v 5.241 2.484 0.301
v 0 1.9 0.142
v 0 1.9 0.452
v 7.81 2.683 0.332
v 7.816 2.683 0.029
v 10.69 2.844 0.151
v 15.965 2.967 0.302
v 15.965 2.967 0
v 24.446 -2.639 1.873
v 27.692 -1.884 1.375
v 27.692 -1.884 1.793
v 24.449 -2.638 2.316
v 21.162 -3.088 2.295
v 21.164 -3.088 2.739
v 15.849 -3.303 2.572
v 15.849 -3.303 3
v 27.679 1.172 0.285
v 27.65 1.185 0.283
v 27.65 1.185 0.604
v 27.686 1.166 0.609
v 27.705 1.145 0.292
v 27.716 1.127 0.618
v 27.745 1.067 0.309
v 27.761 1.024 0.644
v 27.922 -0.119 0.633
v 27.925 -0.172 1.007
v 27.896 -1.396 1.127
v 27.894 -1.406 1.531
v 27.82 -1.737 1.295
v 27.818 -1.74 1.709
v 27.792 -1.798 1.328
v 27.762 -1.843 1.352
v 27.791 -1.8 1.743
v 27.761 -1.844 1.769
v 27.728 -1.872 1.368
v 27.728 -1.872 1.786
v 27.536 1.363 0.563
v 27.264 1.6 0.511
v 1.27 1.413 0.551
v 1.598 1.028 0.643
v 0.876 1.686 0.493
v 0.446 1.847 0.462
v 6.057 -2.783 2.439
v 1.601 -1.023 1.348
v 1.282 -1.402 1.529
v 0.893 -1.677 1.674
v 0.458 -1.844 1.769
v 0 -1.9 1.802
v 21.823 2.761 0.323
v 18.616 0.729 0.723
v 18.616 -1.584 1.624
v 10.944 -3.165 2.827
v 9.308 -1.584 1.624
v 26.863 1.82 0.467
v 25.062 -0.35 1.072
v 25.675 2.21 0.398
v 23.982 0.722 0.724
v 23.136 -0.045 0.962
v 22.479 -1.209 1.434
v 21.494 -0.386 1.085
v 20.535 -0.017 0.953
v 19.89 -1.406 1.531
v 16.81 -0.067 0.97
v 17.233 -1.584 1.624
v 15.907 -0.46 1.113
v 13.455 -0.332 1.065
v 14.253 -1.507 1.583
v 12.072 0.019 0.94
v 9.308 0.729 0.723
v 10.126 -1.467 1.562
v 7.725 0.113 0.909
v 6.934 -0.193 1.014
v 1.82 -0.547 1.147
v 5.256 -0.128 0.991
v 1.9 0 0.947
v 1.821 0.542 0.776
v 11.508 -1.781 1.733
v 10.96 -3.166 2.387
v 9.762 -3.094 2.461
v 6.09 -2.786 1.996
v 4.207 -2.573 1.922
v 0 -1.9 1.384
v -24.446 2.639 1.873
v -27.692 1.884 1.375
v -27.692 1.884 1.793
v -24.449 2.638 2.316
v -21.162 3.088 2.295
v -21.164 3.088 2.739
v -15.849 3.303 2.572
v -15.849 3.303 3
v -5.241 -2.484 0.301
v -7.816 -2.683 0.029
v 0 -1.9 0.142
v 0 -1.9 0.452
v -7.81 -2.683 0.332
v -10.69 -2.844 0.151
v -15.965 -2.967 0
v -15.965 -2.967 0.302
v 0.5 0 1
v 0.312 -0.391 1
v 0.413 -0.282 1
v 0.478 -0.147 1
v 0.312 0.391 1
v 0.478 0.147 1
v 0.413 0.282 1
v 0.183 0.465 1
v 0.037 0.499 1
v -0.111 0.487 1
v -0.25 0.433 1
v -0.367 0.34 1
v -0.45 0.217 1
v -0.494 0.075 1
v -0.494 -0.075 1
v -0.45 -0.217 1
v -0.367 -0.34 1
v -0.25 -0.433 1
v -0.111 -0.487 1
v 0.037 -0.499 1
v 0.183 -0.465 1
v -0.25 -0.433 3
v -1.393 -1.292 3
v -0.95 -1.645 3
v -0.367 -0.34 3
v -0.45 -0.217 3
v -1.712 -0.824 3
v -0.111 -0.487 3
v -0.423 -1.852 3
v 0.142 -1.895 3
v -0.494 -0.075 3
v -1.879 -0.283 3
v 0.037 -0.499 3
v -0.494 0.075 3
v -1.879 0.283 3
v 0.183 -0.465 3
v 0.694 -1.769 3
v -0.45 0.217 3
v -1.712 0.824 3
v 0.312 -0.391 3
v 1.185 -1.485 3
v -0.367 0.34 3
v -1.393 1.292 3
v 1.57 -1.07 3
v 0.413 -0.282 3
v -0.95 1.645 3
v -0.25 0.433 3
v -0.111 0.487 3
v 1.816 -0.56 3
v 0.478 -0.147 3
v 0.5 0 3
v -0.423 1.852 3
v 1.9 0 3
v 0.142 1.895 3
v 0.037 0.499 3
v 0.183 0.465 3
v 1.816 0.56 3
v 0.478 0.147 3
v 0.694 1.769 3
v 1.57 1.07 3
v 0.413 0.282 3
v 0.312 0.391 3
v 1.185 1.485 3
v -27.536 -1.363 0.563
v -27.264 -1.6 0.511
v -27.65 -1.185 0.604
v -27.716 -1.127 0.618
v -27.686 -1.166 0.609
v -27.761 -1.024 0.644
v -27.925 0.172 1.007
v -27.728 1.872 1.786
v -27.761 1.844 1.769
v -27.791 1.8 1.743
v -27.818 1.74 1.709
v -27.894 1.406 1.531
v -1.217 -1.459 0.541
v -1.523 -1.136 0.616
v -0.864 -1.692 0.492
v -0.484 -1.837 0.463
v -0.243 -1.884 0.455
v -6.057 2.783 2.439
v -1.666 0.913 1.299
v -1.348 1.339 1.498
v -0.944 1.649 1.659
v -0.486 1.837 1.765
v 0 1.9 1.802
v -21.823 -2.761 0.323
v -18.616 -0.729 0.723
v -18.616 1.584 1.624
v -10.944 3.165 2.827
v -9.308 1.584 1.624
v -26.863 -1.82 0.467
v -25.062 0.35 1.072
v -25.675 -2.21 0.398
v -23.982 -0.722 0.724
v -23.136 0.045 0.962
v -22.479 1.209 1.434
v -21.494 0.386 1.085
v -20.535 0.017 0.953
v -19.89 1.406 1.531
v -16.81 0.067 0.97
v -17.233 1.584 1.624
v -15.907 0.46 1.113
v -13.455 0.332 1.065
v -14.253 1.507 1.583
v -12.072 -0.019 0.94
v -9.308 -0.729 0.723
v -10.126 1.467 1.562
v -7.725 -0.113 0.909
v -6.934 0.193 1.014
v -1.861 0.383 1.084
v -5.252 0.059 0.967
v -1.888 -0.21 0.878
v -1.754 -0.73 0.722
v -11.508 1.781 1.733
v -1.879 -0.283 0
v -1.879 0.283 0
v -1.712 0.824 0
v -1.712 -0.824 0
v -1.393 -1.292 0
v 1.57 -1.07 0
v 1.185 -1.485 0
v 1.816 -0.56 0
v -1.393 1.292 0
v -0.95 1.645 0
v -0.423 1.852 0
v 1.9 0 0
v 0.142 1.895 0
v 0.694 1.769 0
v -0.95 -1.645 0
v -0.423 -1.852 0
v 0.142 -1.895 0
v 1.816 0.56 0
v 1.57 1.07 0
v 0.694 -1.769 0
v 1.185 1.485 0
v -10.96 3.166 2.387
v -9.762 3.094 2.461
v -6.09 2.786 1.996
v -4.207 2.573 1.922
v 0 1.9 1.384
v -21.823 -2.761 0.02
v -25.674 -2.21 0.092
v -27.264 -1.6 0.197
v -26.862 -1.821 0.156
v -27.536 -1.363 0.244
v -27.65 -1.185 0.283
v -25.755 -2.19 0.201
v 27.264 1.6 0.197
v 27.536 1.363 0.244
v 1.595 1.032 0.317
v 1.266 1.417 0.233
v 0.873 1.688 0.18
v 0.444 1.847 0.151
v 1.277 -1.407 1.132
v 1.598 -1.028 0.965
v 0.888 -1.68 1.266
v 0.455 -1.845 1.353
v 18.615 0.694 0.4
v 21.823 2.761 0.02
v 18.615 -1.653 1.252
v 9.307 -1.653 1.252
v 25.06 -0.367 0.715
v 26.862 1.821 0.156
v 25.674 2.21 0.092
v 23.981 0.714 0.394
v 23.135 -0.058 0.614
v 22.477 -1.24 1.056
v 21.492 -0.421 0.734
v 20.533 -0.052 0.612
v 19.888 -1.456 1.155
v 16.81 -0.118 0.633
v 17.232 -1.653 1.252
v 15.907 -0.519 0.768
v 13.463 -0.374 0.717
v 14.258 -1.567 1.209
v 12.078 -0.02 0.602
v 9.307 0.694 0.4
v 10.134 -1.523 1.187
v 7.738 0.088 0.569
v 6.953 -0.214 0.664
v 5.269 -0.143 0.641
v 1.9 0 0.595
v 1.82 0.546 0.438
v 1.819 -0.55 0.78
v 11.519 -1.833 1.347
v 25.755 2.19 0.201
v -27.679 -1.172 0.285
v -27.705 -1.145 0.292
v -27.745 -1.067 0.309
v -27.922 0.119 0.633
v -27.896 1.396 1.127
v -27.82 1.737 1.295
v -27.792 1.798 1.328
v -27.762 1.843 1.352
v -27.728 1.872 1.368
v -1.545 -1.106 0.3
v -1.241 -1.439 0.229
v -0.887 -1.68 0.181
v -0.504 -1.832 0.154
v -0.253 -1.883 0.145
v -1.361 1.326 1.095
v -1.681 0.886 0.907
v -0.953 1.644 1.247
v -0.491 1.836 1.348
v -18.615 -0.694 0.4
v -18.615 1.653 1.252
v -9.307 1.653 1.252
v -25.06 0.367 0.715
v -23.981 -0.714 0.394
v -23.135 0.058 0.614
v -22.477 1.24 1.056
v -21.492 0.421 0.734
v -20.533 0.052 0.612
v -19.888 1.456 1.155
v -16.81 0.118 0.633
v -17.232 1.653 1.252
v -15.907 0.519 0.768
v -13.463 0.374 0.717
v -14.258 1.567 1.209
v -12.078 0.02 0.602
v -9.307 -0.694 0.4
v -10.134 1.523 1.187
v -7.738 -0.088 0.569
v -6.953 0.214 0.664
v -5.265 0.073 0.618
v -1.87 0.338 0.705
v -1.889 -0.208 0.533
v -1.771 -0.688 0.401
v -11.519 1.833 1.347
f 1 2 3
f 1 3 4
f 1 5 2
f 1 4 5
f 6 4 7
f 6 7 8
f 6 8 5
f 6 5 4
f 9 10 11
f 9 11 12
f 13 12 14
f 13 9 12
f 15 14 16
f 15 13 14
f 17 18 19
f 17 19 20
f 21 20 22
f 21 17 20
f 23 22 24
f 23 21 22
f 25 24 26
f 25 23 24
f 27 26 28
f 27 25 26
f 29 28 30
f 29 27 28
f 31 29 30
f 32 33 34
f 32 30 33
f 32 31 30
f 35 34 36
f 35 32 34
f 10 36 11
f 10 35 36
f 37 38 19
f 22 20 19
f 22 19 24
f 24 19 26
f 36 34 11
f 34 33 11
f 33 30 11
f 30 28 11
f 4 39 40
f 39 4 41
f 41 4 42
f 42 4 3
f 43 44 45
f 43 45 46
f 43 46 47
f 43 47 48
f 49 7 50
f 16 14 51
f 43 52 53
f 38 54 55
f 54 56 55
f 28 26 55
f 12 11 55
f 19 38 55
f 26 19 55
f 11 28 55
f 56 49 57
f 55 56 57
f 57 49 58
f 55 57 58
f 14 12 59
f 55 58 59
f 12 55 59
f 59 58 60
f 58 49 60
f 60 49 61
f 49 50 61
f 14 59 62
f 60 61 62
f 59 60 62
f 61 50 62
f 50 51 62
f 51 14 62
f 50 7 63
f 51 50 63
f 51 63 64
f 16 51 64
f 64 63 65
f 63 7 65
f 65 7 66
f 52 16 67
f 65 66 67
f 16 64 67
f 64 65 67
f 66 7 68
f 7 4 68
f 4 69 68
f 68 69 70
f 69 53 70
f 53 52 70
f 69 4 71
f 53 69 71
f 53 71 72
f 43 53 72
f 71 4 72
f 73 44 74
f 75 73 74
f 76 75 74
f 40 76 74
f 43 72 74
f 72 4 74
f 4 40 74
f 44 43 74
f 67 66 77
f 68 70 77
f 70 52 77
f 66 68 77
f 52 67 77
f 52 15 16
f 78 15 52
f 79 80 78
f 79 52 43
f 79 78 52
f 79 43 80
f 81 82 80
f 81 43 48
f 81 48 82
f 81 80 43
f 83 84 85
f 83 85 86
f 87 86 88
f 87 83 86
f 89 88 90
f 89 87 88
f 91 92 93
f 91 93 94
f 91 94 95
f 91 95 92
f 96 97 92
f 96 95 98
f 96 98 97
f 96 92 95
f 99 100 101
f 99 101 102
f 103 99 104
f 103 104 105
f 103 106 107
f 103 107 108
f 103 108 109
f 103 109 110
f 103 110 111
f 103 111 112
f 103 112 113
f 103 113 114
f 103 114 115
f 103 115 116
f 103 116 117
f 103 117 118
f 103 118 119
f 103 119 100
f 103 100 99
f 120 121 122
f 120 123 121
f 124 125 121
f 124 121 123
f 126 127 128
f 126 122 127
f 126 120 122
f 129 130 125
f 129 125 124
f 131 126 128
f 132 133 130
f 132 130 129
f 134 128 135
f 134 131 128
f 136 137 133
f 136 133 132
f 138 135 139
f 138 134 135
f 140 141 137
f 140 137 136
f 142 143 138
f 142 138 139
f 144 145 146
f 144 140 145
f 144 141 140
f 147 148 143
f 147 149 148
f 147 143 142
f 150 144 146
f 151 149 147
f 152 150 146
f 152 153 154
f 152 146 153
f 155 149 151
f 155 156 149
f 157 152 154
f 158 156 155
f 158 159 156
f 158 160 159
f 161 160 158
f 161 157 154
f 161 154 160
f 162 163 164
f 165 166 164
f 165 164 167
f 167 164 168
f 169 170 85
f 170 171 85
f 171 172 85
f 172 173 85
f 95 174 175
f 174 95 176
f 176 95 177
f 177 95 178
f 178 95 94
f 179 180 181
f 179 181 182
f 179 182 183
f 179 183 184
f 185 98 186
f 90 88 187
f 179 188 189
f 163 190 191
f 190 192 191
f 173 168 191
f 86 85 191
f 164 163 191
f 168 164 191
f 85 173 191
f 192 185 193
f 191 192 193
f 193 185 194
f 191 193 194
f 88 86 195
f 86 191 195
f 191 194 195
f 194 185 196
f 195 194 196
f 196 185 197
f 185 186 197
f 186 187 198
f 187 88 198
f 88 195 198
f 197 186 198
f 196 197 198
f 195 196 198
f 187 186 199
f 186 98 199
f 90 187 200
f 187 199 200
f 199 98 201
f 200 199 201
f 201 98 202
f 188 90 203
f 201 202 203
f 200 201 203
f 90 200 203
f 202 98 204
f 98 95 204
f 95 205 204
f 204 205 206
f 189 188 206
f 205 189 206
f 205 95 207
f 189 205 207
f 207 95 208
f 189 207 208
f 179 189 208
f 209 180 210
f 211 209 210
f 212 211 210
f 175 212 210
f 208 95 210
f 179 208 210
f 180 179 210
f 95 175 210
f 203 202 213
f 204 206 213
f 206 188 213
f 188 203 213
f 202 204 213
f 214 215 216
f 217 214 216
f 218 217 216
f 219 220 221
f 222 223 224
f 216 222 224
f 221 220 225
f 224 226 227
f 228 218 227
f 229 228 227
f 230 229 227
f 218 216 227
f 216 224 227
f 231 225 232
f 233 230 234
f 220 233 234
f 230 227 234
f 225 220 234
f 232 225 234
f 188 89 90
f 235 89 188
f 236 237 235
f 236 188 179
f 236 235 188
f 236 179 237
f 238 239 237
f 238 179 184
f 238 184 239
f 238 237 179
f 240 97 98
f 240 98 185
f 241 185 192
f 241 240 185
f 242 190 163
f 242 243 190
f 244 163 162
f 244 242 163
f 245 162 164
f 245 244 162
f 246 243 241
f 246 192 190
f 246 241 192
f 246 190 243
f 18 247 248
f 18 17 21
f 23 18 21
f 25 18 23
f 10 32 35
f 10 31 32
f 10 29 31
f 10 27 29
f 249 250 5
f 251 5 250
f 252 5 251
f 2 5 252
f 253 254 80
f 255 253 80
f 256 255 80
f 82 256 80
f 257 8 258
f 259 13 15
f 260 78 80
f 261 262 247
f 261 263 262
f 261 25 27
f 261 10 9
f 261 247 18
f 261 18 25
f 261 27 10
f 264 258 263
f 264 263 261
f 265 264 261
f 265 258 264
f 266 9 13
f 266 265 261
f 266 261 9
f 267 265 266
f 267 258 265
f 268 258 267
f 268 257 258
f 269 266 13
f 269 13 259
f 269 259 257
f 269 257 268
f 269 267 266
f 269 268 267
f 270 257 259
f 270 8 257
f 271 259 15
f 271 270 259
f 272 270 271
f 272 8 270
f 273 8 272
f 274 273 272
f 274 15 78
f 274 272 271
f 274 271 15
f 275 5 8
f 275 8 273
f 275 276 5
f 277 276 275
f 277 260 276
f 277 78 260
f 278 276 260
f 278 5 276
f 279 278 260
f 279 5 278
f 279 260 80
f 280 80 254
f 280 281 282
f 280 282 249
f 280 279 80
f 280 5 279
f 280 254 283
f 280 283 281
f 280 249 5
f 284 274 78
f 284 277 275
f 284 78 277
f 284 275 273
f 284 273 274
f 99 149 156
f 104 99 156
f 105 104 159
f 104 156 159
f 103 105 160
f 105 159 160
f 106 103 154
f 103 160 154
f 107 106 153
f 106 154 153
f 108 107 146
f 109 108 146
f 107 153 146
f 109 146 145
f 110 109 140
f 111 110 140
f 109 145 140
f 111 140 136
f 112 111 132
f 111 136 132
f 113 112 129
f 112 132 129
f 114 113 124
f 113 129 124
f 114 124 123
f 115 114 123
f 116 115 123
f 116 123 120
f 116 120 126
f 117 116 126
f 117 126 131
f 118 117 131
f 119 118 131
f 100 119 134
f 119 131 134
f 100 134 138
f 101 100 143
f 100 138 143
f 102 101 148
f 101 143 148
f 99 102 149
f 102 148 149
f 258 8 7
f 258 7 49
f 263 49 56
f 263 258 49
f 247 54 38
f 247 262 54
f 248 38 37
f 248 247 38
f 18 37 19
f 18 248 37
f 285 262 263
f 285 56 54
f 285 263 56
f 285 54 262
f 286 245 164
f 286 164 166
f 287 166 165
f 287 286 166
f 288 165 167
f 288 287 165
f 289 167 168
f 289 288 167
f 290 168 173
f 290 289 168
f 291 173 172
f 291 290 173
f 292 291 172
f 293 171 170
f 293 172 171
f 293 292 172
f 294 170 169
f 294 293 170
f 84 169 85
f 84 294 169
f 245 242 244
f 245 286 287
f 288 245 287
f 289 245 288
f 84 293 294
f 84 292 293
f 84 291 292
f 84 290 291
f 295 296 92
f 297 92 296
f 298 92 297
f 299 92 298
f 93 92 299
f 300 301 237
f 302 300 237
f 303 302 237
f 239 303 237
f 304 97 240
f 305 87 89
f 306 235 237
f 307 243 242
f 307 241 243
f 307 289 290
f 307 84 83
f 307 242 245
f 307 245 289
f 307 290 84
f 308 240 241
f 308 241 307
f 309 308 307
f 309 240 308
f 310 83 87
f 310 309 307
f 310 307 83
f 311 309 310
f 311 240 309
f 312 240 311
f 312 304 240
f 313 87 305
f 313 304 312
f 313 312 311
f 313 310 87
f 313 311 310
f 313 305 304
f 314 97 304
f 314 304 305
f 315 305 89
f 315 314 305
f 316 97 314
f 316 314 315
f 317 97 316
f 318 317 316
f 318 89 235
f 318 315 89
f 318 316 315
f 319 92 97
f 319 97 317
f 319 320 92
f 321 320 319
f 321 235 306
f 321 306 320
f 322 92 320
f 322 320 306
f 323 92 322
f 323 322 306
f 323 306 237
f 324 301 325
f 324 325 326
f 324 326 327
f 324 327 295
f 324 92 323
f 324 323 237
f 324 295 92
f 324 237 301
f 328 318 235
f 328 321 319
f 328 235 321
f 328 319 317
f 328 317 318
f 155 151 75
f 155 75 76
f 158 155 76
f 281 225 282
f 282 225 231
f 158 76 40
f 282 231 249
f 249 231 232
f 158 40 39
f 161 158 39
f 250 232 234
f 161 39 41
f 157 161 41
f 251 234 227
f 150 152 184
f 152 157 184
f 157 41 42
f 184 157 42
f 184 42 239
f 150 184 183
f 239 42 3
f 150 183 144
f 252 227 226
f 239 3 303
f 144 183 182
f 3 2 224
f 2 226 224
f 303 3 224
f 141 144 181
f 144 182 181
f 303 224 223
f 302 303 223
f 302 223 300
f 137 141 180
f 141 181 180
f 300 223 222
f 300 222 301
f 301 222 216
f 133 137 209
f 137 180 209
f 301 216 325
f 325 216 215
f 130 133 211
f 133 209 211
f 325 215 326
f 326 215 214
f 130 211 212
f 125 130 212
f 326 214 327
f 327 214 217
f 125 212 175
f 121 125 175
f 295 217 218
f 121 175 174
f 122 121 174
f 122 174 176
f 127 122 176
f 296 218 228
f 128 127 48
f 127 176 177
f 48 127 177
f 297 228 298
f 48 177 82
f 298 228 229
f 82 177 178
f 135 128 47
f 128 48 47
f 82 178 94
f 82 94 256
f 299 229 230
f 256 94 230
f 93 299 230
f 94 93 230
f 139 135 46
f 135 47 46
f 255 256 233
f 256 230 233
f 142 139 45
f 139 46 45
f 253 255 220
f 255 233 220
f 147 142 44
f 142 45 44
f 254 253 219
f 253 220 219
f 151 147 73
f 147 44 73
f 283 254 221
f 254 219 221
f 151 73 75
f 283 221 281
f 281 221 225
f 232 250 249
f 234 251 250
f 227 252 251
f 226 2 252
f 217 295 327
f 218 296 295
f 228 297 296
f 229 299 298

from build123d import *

# Parameters (mm, degrees)
ESBO_O1_R                  = 1.9
RESSALTO_EXTRUS_O1_DEPTH   = 3
RESSALTO_EXTRUS_O3_DEPTH   = 28
CORTE_EXTRUS_O_FINA4_START = -3.000000318
CORTE_EXTRUS_O_FINA4_DEPTH = 3.000000318
PADR_OCIRCULAR1_COUNT      = 2
ESBO_O5_R                  = 0.5
CORTE_EXTRUS_O5_DEPTH      = 2


# Read off the part's stored shape, not the designer's step: Corte-Extrusão-Fina4
with BuildPart() as part:
    # Esboço1 → Ressalto-extrusão1 (new body)
    with BuildSketch(Plane.XY):
        Circle(ESBO_O1_R)
    extrude(amount=RESSALTO_EXTRUS_O1_DEPTH)

    # Esboço4 → Ressalto-extrusão3 (add)
    with BuildSketch(Plane(origin=(0, 0, 0), x_dir=(0, 0, -1), z_dir=(1, 0, 0))):
        with BuildLine():
            Line((0, 2.966582109), (-0.302284292, 2.966582109))
            add(Edge.make_bspline(
                [(-0.302284292, 2.966582109), (-0.48011033, 0.989335618), (-1.388364091, -2.104701367), (-3, -3.303217097)],
                knots=[0, 0, 0, 0, 1, 1, 1, 1], degree=3))
            Line((-3, -3.303217097), (-2.572366731, -3.303217097))
            add(Edge.make_bspline(
                [(0, 2.966582109), (-0.177826038, 0.989335618), (-1.013540392, -2.259955739), (-2.572366731, -3.303217097)],
                knots=[0, 0, 0, 0, 1, 1, 1, 1], degree=3))
        make_face()
    ressalto_extrus_o3 = extrude(amount=RESSALTO_EXTRUS_O3_DEPTH)

    # Corte-Extrusão-Fina4 outline → Corte-Extrusão-Fina4 (cut)
    with BuildSketch(Plane.XY.offset(3).offset(CORTE_EXTRUS_O_FINA4_START)):
        with BuildLine():
            add(Edge.make_bspline(
                [(15.965244027, 2.966582109), (22.160101016, 2.966582102), (27.105451106, 2.406382612), (27.65, 1.185252223)],
                knots=[0.449610583, 0.449610583, 0.449610583, 0.449610583, 1, 1, 1, 1], degree=3))
            add(Edge.make_bspline(
                [(27.65, 1.185252223), (27.943589962, 1.15875623), (28.093651275, -1.845186793), (27.691880485, -1.884412653)],
                knots=[0, 0, 0, 0, 1, 1, 1, 1], degree=3))
            add(Edge.make_bspline(
                [(27.691880485, -1.884412653), (25.053075141, -2.604086837), (21.639173149, -3.168169457), (17.53715106, -3.303217097), (15.849087583, -3.303217097)],
                knots=[0, 0, 0, 0, 0.243203402, 0.407668544, 0.407668544, 0.407668544, 0.407668544], degree=3))
            Line((15.849087583, -3.303217097), (28, -3.303217097))
            Line((28, -3.303217097), (28, 2.966582109))
            Line((28, 2.966582109), (15.965244027, 2.966582109))
        make_face()
        with BuildLine():
            add(Edge.make_bspline(
                [(0, 1.9), (5.010325131, 2.59275087), (10.904693859, 2.966582115), (15.965244027, 2.966582109)],
                knots=[0, 0, 0, 0, 0.449610583, 0.449610583, 0.449610583, 0.449610583], degree=3))
            Line((15.965244027, 2.966582109), (0, 2.966582109))
            Line((0, 2.966582109), (0, 1.9))
        make_face()
        with BuildLine():
            Line((0, -3.303217097), (15.849087583, -3.303217097))
            add(Edge.make_bspline(
                [(15.849087583, -3.303217097), (9.769421811, -3.303217097), (3.259233415, -2.59651639), (0, -1.9)],
                knots=[0.407668544, 0.407668544, 0.407668544, 0.407668544, 1, 1, 1, 1], degree=3))
            Line((0, -1.9), (0, -3.303217097))
        make_face()
    corte_extrus_o_fina4 = extrude(amount=CORTE_EXTRUS_O_FINA4_DEPTH, mode=Mode.SUBTRACT)

    # PadrãoCircular1: Ressalto-extrusão3, Corte-Extrusão-Fina4 ×2 about axis
    padr_ocircular1_axis = Axis((0, 0, 3), (0, 0, -1))
    add([ressalto_extrus_o3.rotate(padr_ocircular1_axis, i * 360 / PADR_OCIRCULAR1_COUNT) for i in range(1, PADR_OCIRCULAR1_COUNT)])
    add([corte_extrus_o_fina4.rotate(padr_ocircular1_axis, i * 360 / PADR_OCIRCULAR1_COUNT) for i in range(1, PADR_OCIRCULAR1_COUNT)], mode=Mode.SUBTRACT)

    # Esboço5 → Corte-extrusão5 (cut)
    with BuildSketch(Plane.XY.offset(3)):
        Circle(ESBO_O5_R)
    extrude(amount=-CORTE_EXTRUS_O5_DEPTH, mode=Mode.SUBTRACT)


solid = part.part
